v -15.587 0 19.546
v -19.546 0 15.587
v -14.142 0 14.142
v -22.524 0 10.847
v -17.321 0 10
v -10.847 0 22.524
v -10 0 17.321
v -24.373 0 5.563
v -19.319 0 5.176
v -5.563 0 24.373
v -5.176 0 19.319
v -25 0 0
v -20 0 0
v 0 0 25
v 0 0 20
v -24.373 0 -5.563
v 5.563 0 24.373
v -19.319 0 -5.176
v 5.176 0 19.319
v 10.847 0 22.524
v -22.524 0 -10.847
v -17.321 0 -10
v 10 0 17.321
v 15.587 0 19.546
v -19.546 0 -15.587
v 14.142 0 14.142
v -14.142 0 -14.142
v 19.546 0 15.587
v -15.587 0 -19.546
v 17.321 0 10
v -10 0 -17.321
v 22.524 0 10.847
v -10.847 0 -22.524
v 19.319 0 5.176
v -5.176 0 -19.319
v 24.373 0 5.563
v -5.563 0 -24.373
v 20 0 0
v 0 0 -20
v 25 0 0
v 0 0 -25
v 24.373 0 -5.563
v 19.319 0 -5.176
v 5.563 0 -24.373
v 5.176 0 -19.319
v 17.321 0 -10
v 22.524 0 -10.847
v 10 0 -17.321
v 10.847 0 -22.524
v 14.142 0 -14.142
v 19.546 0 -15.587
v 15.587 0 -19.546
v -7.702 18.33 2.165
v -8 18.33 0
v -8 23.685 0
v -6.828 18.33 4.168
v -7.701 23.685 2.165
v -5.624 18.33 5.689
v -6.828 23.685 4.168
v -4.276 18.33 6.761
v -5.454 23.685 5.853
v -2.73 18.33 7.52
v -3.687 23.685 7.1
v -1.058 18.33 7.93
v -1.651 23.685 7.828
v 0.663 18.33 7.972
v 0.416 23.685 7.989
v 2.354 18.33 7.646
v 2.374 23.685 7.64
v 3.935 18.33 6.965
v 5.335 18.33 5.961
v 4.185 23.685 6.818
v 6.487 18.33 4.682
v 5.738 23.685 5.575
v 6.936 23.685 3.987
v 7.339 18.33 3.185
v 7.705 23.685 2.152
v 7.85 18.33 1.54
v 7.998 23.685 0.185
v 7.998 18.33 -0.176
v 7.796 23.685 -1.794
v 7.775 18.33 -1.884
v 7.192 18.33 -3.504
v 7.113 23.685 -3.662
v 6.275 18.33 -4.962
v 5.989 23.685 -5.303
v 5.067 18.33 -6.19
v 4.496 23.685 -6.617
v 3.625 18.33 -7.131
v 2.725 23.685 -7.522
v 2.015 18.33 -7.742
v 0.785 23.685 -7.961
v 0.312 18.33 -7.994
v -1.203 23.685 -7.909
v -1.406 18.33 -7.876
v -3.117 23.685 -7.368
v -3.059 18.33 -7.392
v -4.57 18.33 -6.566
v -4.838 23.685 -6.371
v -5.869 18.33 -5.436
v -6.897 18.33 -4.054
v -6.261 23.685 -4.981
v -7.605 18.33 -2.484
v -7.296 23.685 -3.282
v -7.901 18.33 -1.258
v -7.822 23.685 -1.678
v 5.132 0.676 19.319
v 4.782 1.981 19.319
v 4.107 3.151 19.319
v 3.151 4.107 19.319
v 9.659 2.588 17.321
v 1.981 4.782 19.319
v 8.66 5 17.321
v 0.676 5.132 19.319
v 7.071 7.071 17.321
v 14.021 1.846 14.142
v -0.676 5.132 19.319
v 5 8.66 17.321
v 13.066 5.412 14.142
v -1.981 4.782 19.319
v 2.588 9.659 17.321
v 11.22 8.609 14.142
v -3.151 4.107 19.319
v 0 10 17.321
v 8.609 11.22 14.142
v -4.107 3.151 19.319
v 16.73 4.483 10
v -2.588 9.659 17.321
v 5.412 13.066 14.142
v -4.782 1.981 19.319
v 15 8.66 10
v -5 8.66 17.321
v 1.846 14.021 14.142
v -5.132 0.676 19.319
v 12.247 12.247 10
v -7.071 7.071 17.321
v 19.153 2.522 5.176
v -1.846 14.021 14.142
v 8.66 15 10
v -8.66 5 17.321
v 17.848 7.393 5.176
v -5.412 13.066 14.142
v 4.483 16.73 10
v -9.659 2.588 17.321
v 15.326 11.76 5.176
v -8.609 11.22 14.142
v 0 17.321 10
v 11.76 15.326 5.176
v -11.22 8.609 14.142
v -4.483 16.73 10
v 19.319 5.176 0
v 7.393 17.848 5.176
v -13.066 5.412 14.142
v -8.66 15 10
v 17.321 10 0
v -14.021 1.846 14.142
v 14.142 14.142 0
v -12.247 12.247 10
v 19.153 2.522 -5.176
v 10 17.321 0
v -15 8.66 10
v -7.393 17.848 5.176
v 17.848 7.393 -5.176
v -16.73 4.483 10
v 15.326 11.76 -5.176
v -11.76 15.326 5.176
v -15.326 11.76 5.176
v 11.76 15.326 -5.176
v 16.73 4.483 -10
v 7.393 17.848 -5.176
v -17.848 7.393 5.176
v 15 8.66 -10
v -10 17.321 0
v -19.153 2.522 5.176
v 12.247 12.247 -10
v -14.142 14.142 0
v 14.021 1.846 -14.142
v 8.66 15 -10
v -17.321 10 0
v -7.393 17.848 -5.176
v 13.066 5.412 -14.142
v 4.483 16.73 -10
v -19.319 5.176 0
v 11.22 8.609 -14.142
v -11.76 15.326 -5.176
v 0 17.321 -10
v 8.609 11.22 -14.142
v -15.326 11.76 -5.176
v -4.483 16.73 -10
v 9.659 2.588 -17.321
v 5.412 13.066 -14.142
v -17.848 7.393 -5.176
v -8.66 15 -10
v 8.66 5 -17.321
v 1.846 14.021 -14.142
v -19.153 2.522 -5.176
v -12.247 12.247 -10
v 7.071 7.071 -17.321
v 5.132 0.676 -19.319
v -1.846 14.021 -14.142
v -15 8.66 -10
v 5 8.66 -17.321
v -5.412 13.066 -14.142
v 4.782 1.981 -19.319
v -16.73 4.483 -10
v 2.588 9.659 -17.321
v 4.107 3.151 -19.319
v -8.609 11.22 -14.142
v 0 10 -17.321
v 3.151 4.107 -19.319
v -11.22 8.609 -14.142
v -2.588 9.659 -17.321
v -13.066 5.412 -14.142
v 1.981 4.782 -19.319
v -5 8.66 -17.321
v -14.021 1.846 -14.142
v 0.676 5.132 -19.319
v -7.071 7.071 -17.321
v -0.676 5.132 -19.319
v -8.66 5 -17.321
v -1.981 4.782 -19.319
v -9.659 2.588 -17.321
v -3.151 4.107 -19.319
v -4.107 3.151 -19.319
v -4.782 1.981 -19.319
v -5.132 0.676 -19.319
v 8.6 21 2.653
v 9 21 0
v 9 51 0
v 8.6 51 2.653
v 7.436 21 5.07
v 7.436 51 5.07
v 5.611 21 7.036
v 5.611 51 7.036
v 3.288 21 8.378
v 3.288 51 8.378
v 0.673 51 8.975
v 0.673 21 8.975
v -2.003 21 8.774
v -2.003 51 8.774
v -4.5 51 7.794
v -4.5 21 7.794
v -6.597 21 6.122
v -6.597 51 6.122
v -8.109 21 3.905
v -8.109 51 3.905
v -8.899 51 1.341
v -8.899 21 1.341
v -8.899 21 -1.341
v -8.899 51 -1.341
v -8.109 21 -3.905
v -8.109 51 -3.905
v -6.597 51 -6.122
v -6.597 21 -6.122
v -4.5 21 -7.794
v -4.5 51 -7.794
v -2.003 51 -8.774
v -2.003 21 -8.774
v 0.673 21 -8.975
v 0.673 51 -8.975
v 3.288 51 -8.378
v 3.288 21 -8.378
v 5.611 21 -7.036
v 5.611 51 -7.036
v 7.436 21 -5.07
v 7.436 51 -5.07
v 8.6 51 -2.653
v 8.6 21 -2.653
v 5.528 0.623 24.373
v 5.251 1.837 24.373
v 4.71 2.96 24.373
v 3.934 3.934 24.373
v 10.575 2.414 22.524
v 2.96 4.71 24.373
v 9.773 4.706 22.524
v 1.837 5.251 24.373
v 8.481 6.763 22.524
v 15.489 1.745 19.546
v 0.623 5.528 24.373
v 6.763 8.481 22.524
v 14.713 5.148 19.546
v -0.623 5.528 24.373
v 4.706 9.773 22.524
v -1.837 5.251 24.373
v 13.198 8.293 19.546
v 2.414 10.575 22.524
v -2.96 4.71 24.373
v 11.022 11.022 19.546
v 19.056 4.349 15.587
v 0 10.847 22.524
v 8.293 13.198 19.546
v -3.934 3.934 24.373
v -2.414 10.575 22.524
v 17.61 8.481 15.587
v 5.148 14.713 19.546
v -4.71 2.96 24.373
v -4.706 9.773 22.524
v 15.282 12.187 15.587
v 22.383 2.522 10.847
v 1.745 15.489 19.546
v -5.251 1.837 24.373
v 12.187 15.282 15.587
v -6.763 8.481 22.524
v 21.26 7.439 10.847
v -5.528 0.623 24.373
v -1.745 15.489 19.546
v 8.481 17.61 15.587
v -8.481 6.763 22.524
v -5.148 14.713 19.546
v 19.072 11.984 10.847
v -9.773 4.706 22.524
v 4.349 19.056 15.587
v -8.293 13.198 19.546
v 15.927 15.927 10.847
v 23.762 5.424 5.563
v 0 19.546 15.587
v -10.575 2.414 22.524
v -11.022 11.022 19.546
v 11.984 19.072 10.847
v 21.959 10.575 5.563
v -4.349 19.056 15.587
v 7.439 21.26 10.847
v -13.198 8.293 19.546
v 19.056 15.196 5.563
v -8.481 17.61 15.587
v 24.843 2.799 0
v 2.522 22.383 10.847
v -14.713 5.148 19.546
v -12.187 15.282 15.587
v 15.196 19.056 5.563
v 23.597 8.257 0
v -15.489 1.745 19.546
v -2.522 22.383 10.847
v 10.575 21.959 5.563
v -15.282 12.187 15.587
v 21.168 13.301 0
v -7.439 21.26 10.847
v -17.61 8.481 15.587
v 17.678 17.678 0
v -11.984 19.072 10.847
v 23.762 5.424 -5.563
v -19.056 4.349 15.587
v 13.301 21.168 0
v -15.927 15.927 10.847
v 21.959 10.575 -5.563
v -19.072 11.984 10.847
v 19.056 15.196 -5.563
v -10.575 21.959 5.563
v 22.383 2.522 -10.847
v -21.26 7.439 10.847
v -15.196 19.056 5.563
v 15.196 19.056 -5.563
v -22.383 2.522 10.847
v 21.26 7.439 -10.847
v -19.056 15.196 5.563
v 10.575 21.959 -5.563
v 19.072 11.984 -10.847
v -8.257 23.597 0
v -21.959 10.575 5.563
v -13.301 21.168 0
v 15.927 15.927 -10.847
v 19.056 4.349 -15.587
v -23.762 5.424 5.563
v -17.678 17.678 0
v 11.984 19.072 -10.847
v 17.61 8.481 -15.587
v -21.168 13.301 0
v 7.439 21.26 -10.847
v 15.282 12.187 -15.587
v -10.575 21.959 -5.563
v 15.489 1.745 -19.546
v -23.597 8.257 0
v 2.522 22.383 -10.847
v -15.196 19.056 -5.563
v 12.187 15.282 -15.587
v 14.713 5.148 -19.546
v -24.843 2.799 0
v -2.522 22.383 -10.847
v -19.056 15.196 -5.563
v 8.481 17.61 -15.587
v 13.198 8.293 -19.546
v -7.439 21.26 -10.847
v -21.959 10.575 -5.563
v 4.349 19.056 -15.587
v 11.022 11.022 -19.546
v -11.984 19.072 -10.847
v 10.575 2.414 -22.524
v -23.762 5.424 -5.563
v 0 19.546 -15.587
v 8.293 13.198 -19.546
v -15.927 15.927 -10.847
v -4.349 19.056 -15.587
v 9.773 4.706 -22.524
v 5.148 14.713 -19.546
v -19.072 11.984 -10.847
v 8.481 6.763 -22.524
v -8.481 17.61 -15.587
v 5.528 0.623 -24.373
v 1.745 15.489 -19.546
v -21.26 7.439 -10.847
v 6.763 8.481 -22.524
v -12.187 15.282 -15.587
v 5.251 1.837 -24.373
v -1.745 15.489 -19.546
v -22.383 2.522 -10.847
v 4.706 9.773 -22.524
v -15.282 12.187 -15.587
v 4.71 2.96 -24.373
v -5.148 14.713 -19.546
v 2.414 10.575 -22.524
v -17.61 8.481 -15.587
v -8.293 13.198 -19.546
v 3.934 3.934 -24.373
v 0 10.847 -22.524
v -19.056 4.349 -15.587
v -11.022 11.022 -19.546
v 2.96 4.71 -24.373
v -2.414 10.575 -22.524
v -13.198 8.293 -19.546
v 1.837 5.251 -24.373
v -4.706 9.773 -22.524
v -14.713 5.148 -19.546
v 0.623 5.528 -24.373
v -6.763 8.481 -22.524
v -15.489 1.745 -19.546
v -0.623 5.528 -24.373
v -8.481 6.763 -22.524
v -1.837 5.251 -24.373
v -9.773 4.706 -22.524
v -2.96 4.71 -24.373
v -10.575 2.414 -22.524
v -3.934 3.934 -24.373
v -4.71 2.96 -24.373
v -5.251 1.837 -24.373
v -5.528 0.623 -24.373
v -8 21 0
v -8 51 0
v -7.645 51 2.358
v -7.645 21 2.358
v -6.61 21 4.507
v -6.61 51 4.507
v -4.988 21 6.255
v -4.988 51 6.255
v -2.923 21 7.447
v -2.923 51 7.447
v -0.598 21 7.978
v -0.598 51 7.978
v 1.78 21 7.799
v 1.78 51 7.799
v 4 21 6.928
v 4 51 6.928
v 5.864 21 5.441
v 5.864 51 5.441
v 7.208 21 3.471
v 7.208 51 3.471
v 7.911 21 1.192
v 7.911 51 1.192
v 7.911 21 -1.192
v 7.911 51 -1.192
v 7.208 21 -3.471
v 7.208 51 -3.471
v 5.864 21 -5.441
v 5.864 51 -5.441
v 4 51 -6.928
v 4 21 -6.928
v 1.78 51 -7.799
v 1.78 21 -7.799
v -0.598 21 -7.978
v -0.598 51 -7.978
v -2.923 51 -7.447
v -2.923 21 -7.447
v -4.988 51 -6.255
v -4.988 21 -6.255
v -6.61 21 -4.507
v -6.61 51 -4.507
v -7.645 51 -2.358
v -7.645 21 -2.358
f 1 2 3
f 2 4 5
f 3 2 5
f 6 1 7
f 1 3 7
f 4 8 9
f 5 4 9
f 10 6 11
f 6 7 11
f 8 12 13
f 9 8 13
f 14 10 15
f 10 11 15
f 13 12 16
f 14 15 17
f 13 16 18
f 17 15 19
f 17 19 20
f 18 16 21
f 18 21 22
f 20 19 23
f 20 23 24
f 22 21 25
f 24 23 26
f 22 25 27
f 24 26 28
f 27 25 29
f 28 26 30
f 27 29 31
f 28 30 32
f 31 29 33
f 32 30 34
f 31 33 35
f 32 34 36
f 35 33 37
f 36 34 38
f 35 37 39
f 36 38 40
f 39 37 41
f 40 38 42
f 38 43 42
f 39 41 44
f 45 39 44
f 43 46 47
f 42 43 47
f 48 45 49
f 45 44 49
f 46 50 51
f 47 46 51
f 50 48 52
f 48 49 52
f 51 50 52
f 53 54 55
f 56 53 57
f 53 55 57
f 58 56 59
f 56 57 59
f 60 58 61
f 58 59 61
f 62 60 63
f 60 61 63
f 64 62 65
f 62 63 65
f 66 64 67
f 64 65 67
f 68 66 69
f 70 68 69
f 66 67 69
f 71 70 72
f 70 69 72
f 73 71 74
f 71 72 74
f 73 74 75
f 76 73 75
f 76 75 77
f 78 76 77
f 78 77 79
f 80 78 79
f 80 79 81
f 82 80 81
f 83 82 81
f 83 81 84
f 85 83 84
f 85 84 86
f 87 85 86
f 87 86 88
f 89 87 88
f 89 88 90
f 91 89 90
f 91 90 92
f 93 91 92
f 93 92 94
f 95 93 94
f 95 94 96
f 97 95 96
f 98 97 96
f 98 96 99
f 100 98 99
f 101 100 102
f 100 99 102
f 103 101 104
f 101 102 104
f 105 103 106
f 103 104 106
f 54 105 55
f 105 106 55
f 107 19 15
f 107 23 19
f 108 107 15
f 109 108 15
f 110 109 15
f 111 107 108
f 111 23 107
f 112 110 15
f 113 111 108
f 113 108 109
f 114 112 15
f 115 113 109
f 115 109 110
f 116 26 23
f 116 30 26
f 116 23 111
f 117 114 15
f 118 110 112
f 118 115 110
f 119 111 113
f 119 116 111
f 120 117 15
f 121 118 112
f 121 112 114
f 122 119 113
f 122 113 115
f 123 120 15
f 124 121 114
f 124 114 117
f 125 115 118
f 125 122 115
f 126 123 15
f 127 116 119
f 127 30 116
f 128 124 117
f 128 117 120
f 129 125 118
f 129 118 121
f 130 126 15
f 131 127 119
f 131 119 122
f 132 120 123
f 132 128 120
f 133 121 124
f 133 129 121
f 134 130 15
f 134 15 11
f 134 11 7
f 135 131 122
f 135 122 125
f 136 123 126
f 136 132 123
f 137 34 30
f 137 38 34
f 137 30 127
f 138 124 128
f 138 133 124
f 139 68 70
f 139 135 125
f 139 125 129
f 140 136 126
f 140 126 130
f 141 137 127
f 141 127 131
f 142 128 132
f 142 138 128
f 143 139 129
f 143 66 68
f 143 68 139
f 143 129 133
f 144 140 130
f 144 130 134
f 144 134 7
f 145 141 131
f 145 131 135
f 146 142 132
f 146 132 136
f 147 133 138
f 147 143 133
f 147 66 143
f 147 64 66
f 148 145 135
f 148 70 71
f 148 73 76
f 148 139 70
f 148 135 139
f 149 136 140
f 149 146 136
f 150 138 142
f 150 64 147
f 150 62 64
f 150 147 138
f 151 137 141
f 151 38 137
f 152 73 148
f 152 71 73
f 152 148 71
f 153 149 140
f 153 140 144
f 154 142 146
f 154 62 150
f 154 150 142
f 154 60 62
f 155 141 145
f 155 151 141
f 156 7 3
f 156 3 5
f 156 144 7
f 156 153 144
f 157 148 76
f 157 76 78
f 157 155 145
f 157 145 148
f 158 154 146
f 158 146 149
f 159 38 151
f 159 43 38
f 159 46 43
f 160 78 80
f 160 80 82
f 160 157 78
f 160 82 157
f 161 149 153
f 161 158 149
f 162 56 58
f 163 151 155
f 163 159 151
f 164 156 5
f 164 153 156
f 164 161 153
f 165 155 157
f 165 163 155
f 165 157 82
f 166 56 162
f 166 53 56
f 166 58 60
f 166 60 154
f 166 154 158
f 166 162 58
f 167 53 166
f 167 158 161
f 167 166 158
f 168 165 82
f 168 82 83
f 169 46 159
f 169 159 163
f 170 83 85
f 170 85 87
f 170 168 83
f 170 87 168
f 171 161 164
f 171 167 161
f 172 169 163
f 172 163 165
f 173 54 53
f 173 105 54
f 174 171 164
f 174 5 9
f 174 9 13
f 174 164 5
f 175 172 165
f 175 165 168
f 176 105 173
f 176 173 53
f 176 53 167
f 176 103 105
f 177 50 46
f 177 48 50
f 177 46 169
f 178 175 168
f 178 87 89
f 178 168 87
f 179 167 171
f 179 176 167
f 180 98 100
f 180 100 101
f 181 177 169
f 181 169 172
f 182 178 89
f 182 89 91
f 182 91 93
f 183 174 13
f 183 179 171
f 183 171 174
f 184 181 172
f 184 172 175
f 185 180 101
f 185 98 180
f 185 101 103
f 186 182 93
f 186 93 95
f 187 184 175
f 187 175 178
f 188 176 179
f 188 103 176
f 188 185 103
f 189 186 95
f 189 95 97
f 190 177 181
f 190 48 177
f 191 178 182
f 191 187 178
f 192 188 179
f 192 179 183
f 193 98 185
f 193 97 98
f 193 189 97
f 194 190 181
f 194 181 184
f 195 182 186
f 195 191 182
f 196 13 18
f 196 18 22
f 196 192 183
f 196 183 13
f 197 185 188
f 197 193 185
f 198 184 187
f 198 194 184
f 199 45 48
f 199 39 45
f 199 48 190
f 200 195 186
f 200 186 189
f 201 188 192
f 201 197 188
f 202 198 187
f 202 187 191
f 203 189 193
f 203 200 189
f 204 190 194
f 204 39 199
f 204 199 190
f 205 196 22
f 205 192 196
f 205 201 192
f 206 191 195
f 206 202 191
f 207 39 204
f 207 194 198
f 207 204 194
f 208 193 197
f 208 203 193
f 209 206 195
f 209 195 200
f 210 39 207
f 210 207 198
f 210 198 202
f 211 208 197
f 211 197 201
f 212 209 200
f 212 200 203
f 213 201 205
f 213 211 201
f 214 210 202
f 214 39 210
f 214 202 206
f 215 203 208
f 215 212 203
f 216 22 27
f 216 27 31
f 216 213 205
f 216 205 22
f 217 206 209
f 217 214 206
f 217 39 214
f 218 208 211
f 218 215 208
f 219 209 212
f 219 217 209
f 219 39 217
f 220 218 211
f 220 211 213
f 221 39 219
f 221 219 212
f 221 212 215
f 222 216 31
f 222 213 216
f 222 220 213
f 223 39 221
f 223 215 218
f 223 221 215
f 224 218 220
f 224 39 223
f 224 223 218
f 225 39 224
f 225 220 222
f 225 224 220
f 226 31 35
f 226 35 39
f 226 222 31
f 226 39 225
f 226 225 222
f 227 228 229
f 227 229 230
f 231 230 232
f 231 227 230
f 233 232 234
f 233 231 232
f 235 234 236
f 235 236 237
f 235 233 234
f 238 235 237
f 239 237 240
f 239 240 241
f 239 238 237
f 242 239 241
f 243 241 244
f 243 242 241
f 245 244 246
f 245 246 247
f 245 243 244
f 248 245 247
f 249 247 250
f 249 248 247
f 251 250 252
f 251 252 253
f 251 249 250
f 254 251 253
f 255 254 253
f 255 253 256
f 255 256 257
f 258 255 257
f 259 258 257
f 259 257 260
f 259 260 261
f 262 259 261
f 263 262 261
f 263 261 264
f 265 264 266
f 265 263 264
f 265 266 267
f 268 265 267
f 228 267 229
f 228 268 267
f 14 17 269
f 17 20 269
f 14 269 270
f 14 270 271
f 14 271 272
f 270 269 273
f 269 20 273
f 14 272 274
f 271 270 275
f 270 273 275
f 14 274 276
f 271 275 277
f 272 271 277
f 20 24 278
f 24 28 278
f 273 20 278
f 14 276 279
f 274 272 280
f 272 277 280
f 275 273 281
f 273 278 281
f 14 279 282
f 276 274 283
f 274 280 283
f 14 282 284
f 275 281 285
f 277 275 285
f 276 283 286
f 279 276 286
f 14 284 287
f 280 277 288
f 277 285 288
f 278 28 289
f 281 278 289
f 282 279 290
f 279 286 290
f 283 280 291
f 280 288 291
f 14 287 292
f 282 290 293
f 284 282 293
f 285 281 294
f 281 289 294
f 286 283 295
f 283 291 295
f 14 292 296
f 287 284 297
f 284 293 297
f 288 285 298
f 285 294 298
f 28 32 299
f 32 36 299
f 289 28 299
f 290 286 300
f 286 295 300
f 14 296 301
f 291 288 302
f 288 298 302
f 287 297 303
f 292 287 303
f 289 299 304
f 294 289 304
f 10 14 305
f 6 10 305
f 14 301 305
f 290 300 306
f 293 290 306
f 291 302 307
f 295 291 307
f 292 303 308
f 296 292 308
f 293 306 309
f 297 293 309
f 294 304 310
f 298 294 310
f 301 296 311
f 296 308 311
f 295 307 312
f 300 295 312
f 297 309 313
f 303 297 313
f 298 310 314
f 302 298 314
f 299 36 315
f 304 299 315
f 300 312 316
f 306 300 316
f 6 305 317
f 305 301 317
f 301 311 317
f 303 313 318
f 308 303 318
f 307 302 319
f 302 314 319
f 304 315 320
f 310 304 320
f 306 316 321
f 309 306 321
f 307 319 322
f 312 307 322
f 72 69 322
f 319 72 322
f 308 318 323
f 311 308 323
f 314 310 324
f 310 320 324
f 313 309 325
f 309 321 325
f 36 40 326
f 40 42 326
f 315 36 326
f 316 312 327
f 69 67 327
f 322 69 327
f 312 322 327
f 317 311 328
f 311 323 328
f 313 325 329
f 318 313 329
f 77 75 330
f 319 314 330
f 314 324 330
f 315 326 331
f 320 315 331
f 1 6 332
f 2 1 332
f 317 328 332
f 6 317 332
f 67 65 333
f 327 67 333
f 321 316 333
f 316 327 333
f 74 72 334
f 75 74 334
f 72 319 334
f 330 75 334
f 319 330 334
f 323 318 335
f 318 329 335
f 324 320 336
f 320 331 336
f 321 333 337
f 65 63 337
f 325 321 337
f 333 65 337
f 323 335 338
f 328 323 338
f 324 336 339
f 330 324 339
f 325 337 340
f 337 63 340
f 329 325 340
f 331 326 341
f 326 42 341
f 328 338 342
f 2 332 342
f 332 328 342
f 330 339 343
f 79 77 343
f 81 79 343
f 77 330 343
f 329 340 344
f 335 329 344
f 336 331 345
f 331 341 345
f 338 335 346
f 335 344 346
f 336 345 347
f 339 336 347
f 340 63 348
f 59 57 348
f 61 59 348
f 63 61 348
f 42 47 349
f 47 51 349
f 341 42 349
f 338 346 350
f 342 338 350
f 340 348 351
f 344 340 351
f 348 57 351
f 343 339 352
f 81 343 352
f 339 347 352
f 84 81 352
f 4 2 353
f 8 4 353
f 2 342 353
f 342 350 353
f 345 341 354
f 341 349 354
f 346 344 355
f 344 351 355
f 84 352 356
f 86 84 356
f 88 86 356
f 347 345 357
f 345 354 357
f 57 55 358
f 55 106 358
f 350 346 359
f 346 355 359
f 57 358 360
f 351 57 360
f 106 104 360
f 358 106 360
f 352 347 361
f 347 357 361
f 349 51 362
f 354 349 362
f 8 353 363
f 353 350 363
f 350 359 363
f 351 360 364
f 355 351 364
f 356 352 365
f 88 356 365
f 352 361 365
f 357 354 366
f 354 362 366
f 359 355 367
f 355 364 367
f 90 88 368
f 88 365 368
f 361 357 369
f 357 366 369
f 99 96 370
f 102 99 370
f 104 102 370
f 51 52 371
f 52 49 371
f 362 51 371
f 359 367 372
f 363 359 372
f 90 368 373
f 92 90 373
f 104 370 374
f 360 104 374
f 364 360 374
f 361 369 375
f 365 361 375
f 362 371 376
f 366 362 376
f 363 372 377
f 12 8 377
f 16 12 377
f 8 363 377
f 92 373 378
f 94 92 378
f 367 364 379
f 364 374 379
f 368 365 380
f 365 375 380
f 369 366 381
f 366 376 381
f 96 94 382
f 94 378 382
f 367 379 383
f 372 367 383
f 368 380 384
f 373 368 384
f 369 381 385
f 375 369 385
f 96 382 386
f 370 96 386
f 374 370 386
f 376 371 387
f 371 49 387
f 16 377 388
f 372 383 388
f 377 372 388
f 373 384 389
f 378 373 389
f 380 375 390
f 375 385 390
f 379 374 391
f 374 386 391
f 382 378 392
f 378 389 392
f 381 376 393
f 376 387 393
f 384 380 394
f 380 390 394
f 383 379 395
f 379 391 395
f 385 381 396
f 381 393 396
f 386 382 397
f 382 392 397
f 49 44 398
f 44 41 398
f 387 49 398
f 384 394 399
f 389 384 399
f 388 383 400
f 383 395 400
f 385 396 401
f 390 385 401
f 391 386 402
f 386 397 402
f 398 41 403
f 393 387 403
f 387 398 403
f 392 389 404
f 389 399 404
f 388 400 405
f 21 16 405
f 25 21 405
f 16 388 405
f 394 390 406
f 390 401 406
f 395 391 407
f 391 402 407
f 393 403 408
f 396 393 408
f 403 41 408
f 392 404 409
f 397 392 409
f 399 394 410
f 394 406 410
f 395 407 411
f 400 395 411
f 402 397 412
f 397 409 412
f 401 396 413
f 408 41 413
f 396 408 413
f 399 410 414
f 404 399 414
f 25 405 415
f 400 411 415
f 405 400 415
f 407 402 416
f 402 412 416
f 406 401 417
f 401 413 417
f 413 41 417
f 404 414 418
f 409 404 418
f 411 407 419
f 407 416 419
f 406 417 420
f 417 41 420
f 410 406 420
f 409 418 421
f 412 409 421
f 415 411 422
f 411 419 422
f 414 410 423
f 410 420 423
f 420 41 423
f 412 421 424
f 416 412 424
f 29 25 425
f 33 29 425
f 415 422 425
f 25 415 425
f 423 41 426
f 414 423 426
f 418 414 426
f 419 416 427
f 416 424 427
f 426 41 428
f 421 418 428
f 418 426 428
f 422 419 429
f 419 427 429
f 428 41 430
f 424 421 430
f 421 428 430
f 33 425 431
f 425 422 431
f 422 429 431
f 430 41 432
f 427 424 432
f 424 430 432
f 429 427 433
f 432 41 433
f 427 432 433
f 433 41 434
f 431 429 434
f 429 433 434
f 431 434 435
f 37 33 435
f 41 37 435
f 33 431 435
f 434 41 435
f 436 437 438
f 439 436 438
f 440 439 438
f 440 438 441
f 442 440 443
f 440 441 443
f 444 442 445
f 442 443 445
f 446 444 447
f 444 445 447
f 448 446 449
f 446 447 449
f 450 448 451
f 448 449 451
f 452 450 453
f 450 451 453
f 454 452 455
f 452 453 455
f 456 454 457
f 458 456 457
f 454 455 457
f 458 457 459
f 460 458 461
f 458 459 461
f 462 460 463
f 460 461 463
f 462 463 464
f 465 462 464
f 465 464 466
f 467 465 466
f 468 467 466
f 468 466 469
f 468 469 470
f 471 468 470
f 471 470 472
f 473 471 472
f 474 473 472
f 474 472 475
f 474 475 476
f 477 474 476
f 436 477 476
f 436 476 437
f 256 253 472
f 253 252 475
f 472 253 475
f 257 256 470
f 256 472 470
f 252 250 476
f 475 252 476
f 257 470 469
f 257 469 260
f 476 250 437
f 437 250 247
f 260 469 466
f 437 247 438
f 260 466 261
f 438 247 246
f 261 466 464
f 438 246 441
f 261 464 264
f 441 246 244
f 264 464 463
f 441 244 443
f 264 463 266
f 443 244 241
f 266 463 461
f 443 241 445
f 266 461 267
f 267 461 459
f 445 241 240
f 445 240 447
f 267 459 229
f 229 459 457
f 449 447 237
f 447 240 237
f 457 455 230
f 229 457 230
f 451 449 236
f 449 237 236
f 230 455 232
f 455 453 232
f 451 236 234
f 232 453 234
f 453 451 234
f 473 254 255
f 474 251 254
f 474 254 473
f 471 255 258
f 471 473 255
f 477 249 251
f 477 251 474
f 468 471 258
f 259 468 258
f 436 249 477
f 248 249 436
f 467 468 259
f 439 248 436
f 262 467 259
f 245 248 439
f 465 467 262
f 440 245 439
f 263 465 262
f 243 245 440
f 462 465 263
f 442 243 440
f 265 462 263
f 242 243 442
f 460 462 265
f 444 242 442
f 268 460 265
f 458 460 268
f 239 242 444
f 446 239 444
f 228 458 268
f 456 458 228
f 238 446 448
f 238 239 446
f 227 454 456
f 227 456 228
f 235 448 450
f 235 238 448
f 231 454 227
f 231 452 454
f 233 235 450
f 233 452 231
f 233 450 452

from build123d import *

# Parameters (mm, degrees)
REVOLVE1_ANGLE      = 180
CUT_REVOLVE1_ANGLE  = 180
BOSS_EXTRUDE1_START = -21
SKETCH6_R           = 9
BOSS_EXTRUDE1_DEPTH = 30
SKETCH7_R           = 8
CUT_EXTRUDE6_DEPTH  = 35


with BuildPart() as part:
    # Sketch1 → Revolve1 (revolve)
    with BuildSketch(Plane(origin=(0, 0, 0), x_dir=(1, 0, 0), z_dir=(0, 1, 0))):
        with BuildLine():
            Line((0, 25), (0, -25))
            ThreePointArc((0, -25), (25, 0), (0, 25))
        make_face()
    revolve(axis=Axis((0, 0, -25), (0, 0, 1)), revolution_arc=REVOLVE1_ANGLE)

    # Sketch2 → Cut-Revolve1 (revolve, cut)
    with BuildSketch(Plane.XZ):
        with BuildLine():
            Line((0, -20), (0, 20))
            ThreePointArc((0, 20), (20, 0), (0, -20))
        make_face()
    revolve(axis=Axis((0, 0, -20), (0, 0, 1)), revolution_arc=CUT_REVOLVE1_ANGLE, mode=Mode.SUBTRACT)


with BuildPart() as body_2:
    # Sketch6 → Boss-Extrude1 (new body)
    with BuildSketch(Plane(origin=(0, 0, 0), x_dir=(-1, 0, 0), z_dir=(0, -1, 0)).offset(BOSS_EXTRUDE1_START)):
        with Locations(Location((0, 0, 0), (0, 0, 180))):
            Circle(SKETCH6_R)
    extrude(amount=-BOSS_EXTRUDE1_DEPTH)


with BuildPart() as cut_extrude6_tool:
    # Sketch7 → Cut-Extrude6 (new body)
    with BuildSketch(Plane(origin=(0, 51, 0), x_dir=(-1, 0, 0), z_dir=(0, 1, 0))):
        Circle(SKETCH7_R)
    extrude(amount=-CUT_EXTRUDE6_DEPTH)


with BuildPart() as part_1:
    add(part.part)

    # Cut-Extrude6: cut by cut_extrude6_tool
    add(cut_extrude6_tool.part, mode=Mode.SUBTRACT)


with BuildPart() as body_2_1:
    add(body_2.part)

    # Cut-Extrude6: cut by cut_extrude6_tool
    add(cut_extrude6_tool.part, mode=Mode.SUBTRACT)


solid = Compound([part_1.part, body_2_1.part])
